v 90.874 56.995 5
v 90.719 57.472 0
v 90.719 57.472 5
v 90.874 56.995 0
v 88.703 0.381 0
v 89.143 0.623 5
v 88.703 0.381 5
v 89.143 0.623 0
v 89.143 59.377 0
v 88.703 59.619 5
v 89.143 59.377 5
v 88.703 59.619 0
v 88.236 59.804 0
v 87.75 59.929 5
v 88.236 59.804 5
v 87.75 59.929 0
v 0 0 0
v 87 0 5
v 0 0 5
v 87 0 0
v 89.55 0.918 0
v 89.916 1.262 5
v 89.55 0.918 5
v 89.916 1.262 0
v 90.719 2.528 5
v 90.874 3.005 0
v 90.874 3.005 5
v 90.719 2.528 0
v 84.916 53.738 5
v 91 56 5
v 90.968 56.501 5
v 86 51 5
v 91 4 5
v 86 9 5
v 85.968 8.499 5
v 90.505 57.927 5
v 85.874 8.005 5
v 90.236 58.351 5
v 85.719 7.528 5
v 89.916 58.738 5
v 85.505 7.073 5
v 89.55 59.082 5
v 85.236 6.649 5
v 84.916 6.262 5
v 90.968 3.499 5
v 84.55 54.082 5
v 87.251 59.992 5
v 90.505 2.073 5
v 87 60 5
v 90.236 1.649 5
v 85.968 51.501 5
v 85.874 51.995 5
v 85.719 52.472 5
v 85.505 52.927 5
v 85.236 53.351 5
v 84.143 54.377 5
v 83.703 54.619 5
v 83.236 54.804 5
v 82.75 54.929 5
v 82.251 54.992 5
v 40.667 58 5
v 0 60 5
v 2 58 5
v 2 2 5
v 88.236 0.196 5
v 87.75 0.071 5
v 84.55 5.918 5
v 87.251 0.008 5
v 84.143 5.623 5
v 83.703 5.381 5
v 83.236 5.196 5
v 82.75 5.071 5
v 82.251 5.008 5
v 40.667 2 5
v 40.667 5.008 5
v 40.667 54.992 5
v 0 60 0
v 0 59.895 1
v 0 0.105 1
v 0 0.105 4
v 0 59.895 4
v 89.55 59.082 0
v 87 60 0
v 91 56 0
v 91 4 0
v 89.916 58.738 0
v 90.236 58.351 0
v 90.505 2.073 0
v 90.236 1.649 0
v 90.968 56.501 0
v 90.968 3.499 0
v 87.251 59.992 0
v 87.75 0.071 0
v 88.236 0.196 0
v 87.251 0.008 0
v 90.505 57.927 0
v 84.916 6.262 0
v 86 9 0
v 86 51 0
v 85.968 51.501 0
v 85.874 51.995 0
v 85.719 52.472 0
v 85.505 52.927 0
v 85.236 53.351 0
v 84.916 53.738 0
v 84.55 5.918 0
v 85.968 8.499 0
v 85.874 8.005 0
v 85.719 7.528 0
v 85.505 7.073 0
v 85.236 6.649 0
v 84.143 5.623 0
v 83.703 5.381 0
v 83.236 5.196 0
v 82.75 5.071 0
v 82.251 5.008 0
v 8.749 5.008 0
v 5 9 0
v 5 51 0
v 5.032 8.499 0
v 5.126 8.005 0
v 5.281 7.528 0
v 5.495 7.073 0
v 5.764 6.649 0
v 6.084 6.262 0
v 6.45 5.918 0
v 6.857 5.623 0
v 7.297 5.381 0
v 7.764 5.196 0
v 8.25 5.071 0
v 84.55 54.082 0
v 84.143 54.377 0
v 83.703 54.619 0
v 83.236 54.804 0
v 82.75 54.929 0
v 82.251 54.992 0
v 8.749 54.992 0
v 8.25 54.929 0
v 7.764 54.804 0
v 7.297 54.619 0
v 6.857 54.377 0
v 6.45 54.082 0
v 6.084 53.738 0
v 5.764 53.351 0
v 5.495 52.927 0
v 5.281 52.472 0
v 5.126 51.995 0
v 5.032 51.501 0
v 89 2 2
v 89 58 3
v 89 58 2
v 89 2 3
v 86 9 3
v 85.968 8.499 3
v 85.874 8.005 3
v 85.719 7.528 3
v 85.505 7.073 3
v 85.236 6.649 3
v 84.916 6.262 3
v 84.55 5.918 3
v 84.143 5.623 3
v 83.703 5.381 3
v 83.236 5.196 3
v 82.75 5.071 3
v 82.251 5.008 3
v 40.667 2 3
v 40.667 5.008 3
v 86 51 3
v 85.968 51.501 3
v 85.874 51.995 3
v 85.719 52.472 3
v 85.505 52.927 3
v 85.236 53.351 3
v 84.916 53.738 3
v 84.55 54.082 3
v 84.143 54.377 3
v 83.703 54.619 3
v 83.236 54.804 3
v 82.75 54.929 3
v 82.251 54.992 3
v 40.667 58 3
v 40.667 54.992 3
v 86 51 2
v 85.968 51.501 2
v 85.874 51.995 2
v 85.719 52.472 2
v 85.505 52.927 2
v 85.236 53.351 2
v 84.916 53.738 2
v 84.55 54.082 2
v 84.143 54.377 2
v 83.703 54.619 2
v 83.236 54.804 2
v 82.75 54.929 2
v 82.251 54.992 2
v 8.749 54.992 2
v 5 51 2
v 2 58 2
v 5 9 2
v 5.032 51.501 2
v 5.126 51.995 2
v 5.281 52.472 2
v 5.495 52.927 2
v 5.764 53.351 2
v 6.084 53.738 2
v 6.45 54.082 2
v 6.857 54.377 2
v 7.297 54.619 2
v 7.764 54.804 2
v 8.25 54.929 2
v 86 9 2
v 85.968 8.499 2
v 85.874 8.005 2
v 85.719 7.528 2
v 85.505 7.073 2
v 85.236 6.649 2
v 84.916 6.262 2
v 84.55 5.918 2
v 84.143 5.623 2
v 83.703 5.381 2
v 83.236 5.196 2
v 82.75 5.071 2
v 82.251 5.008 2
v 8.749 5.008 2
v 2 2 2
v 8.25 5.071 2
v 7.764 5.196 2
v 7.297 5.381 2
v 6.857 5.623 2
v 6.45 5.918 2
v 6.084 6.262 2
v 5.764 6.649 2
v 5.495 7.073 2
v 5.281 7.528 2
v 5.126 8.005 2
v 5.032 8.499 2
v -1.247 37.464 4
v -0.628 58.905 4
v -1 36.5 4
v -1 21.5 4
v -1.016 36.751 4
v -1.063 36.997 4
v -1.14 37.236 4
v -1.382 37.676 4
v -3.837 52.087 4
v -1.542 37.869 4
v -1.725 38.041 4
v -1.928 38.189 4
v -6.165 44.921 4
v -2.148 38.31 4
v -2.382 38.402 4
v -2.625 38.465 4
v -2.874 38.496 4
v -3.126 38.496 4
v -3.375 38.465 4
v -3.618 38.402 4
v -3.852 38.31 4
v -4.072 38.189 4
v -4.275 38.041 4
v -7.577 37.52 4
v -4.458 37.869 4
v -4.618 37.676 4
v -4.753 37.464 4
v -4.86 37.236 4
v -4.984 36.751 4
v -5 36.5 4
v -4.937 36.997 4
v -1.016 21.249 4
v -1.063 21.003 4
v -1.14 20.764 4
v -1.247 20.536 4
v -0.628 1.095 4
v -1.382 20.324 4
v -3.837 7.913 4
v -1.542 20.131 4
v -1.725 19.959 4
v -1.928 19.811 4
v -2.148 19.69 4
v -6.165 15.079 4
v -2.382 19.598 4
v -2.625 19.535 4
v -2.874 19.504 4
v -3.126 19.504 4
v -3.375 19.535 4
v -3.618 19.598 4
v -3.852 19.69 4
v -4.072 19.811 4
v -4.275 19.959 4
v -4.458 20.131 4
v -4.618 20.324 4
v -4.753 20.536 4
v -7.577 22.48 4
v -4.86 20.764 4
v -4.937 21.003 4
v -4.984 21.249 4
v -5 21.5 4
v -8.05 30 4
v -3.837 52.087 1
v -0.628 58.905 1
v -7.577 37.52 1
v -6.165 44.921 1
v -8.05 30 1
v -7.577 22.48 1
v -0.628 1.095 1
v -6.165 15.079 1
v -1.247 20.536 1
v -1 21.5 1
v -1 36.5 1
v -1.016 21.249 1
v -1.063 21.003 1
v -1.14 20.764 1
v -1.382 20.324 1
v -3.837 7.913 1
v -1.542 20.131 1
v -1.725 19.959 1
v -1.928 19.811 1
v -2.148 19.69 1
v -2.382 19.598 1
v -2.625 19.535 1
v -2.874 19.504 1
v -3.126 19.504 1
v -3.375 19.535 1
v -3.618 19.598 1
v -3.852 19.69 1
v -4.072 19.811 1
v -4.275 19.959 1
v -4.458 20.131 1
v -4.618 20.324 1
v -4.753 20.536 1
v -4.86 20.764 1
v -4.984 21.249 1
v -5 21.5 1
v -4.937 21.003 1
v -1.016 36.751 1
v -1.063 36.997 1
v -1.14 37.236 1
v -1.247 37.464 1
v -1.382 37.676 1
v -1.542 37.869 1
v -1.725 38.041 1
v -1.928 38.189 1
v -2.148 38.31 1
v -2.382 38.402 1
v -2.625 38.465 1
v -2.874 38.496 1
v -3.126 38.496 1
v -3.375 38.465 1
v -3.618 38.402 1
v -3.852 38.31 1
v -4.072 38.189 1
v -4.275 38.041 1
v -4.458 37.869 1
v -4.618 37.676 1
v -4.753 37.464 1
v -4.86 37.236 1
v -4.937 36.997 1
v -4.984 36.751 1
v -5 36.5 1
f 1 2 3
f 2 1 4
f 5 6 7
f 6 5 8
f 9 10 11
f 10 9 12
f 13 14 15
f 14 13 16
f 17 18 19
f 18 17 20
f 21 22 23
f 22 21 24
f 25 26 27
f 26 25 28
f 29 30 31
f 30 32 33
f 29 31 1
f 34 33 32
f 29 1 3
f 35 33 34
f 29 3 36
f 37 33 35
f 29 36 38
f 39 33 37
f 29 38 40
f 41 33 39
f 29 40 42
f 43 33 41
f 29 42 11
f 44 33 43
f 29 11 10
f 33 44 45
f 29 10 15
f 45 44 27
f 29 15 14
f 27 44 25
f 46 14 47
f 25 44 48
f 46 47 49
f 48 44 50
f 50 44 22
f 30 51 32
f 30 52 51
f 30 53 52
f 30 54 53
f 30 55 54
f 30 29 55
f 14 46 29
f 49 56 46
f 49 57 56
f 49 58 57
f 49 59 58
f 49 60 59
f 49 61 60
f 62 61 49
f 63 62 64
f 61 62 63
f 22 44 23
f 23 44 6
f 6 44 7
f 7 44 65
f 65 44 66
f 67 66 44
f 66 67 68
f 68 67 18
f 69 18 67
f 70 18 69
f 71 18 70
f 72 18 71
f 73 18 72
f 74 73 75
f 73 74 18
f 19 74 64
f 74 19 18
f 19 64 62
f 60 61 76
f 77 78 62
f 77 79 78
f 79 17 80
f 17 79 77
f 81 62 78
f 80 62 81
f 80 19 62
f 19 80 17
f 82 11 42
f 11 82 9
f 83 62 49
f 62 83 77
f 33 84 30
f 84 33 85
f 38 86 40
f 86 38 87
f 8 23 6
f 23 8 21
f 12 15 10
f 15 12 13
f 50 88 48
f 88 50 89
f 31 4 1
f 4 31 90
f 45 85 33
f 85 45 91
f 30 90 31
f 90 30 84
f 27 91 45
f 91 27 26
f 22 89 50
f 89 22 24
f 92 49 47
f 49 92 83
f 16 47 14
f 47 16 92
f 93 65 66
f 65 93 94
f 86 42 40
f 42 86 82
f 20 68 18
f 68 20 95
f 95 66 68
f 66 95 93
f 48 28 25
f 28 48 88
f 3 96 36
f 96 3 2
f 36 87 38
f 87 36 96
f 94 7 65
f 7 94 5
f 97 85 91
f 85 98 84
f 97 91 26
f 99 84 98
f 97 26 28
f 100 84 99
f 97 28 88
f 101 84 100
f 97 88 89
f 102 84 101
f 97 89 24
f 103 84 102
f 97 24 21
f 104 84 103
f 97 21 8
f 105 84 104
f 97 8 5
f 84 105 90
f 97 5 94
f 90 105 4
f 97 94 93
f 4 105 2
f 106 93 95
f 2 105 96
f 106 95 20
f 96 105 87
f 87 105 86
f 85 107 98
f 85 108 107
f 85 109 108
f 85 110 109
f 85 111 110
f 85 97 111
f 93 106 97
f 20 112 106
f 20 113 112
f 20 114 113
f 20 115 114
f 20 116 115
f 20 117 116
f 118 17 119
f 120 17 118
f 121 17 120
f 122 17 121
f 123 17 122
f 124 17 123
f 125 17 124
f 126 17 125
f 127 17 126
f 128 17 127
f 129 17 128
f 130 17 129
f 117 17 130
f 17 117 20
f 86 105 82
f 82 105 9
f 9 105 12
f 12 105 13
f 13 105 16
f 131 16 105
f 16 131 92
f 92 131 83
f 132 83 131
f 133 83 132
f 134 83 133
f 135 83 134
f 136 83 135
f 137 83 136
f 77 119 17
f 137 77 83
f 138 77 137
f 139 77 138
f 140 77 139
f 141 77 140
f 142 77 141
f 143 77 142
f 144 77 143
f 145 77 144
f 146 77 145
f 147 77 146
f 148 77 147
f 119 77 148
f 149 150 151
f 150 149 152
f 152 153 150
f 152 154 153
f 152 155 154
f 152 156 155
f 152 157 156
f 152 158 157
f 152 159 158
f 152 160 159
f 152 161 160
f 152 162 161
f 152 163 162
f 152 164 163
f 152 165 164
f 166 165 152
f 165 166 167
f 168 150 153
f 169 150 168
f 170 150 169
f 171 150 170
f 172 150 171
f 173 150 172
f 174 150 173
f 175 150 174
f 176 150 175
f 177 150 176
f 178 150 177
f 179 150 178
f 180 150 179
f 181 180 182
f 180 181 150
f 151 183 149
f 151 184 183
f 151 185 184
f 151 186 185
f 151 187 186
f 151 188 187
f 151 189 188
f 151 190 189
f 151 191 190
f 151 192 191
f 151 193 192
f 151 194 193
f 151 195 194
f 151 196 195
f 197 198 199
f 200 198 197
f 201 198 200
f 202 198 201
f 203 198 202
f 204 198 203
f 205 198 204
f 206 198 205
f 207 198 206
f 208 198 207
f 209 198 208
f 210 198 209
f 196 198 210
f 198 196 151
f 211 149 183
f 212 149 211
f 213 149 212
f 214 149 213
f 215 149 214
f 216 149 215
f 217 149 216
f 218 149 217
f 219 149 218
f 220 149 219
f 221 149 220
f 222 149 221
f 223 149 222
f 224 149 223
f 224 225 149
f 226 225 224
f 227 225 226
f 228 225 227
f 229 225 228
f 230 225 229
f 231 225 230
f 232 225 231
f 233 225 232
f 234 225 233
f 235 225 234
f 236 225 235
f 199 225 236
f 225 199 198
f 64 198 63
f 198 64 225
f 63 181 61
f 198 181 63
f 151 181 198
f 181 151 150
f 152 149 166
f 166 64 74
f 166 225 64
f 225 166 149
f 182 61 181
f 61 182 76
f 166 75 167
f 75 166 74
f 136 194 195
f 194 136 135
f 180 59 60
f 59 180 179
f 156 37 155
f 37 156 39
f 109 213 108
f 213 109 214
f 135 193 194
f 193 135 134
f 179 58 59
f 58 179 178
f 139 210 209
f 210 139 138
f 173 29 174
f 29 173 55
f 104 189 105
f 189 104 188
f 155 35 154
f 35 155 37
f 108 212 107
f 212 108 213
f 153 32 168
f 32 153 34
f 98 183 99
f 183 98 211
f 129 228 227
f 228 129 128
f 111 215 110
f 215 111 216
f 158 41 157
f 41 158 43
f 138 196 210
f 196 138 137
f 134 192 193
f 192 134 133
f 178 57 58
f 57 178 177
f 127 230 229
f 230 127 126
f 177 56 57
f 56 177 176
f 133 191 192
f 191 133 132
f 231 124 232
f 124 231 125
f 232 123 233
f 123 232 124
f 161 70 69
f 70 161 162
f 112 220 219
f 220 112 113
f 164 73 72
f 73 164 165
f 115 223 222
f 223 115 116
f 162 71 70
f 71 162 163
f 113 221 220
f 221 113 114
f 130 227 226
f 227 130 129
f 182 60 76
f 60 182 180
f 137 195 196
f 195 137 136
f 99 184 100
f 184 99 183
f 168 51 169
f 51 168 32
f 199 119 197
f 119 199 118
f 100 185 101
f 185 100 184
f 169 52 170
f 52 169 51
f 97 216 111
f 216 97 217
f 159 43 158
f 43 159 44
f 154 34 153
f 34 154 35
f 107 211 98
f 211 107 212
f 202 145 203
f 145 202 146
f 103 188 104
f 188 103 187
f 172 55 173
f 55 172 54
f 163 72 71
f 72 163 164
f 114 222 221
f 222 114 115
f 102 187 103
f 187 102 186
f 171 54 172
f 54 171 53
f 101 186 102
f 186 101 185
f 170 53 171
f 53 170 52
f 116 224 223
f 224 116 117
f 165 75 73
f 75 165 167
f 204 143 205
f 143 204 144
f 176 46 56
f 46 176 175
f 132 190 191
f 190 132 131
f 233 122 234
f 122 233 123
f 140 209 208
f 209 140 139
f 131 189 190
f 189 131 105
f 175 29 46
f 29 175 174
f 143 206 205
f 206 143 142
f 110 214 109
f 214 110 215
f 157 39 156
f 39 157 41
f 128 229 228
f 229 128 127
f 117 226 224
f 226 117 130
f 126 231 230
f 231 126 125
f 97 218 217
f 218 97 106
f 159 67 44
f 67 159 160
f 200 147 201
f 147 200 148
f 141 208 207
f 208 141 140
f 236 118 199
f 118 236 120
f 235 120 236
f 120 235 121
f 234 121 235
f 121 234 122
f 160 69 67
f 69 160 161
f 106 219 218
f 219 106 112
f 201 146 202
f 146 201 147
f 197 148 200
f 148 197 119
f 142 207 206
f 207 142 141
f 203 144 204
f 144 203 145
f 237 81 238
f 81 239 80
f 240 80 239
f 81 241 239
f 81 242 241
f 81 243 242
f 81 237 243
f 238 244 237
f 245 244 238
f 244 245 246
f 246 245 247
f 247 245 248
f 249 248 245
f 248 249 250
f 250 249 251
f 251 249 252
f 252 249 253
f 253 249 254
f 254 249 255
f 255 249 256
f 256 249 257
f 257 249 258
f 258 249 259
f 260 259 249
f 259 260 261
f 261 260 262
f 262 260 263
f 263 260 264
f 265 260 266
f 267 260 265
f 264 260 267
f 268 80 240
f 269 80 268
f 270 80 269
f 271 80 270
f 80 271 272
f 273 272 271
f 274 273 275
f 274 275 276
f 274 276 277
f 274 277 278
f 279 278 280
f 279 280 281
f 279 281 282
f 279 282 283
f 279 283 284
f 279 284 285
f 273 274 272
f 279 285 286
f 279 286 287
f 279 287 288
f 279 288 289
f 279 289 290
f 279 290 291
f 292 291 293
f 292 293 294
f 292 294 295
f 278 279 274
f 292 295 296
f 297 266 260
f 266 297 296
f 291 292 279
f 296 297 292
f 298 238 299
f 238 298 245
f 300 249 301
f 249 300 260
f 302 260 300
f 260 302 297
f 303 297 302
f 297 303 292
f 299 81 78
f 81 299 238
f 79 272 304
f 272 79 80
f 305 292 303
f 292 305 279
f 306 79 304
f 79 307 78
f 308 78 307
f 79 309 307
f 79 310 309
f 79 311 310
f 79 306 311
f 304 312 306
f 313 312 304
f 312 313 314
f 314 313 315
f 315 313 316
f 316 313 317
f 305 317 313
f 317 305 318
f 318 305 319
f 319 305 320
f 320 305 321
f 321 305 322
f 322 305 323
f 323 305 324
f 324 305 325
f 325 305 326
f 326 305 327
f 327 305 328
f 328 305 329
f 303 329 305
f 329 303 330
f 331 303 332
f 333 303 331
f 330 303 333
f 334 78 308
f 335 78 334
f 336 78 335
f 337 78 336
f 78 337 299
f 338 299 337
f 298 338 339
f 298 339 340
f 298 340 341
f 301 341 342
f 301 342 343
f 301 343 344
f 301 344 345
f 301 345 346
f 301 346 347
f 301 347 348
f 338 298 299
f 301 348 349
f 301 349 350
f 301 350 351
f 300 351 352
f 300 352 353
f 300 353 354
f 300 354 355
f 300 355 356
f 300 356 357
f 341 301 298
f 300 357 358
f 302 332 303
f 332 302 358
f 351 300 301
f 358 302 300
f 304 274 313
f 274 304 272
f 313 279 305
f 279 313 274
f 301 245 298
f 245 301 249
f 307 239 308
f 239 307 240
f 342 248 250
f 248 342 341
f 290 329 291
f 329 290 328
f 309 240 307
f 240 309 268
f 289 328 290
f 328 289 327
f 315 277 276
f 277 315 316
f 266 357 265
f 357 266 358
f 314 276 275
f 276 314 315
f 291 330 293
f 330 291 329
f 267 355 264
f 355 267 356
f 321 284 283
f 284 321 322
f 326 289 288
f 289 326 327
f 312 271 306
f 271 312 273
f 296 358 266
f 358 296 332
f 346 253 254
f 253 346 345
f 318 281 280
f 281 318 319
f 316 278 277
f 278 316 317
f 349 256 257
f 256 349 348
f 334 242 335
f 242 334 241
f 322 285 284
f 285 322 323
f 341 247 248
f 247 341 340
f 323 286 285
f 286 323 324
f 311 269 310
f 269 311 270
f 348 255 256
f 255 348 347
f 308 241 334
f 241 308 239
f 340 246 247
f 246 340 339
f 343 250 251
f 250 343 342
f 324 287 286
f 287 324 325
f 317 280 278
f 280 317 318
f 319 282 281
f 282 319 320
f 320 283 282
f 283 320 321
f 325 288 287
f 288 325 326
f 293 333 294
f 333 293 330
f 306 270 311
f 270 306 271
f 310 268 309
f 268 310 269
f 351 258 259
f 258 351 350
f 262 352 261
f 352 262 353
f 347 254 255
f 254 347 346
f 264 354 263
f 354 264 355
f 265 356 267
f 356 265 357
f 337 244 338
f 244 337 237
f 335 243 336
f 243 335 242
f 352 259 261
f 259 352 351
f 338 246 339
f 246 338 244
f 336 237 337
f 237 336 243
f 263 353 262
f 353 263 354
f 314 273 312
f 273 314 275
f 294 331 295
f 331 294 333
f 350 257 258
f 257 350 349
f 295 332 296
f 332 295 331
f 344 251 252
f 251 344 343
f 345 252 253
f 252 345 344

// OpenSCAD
badge_thickness = 1;
clip_tab_thickness = 3;

/* [Hidden] */
badge_width = 56;
badge_height = 87;

holder_wall_size = 2;
holder_bezel_size = holder_wall_size + 3;

holder_height = badge_height + (holder_wall_size * 2);
holder_width = badge_width + (holder_wall_size * 2);
holder_thickness = badge_thickness  + (holder_wall_size * 2);
holder_radius = 4;

clip_hole_width = 15;
clip_hole_height = 4;

difference() {
  hull() {
    cube(size=[holder_height - holder_radius, holder_width, holder_thickness]);
    
    translate([holder_height - holder_radius, holder_radius, 0])
      cylinder(h=holder_thickness, r=holder_radius, $fn=50);
    translate([holder_height - holder_radius, holder_width - holder_radius, 0])
      cylinder(h=holder_thickness, r=holder_radius, $fn=50);
  }
  
  translate([holder_wall_size,holder_wall_size, holder_wall_size])
    cube(size=[badge_height, badge_width, badge_thickness]);
  
  translate([holder_wall_size,holder_wall_size, holder_wall_size])
    cube(size=[badge_height / 2.25, badge_width, holder_thickness * 2]);
  
  hull() {
    translate([holder_bezel_size + holder_radius, holder_bezel_size + holder_radius, 0])
      cylinder(h=holder_thickness, r=holder_radius, $fn=50);
    translate([holder_bezel_size + holder_radius, holder_width - holder_bezel_size - holder_radius, 0])
      cylinder(h=holder_thickness, r=holder_radius, $fn=50);
    translate([holder_height - holder_bezel_size - holder_radius, holder_bezel_size + holder_radius, 0])
      cylinder(h=holder_thickness, r=holder_radius, $fn=50);
    translate([holder_height - holder_bezel_size - holder_radius, holder_width - holder_bezel_size - holder_radius, 0])
      cylinder(h=holder_thickness, r=holder_radius, $fn=50);
  }
}

difference() {
  translate([holder_width - 8.05, holder_width / 2, holder_thickness / 2 - clip_tab_thickness / 2])
    cylinder(h=clip_tab_thickness, d=holder_width * 2, $fn=50);
  
  translate([0, holder_width * -1.5, -1])
    cube(holder_width * 3, holder_width * 3, 100);
  
  translate([(clip_hole_height / -2) - 1, (holder_width - (clip_hole_width + (clip_hole_height / 2))) / 2, -.5])
  hull() {
    translate([0,clip_hole_width,0])
      cylinder(h=holder_thickness + 1, d=clip_hole_height, $fn=50);
    cylinder(h=holder_thickness + 1, d=clip_hole_height, $fn=50);
  }
}
